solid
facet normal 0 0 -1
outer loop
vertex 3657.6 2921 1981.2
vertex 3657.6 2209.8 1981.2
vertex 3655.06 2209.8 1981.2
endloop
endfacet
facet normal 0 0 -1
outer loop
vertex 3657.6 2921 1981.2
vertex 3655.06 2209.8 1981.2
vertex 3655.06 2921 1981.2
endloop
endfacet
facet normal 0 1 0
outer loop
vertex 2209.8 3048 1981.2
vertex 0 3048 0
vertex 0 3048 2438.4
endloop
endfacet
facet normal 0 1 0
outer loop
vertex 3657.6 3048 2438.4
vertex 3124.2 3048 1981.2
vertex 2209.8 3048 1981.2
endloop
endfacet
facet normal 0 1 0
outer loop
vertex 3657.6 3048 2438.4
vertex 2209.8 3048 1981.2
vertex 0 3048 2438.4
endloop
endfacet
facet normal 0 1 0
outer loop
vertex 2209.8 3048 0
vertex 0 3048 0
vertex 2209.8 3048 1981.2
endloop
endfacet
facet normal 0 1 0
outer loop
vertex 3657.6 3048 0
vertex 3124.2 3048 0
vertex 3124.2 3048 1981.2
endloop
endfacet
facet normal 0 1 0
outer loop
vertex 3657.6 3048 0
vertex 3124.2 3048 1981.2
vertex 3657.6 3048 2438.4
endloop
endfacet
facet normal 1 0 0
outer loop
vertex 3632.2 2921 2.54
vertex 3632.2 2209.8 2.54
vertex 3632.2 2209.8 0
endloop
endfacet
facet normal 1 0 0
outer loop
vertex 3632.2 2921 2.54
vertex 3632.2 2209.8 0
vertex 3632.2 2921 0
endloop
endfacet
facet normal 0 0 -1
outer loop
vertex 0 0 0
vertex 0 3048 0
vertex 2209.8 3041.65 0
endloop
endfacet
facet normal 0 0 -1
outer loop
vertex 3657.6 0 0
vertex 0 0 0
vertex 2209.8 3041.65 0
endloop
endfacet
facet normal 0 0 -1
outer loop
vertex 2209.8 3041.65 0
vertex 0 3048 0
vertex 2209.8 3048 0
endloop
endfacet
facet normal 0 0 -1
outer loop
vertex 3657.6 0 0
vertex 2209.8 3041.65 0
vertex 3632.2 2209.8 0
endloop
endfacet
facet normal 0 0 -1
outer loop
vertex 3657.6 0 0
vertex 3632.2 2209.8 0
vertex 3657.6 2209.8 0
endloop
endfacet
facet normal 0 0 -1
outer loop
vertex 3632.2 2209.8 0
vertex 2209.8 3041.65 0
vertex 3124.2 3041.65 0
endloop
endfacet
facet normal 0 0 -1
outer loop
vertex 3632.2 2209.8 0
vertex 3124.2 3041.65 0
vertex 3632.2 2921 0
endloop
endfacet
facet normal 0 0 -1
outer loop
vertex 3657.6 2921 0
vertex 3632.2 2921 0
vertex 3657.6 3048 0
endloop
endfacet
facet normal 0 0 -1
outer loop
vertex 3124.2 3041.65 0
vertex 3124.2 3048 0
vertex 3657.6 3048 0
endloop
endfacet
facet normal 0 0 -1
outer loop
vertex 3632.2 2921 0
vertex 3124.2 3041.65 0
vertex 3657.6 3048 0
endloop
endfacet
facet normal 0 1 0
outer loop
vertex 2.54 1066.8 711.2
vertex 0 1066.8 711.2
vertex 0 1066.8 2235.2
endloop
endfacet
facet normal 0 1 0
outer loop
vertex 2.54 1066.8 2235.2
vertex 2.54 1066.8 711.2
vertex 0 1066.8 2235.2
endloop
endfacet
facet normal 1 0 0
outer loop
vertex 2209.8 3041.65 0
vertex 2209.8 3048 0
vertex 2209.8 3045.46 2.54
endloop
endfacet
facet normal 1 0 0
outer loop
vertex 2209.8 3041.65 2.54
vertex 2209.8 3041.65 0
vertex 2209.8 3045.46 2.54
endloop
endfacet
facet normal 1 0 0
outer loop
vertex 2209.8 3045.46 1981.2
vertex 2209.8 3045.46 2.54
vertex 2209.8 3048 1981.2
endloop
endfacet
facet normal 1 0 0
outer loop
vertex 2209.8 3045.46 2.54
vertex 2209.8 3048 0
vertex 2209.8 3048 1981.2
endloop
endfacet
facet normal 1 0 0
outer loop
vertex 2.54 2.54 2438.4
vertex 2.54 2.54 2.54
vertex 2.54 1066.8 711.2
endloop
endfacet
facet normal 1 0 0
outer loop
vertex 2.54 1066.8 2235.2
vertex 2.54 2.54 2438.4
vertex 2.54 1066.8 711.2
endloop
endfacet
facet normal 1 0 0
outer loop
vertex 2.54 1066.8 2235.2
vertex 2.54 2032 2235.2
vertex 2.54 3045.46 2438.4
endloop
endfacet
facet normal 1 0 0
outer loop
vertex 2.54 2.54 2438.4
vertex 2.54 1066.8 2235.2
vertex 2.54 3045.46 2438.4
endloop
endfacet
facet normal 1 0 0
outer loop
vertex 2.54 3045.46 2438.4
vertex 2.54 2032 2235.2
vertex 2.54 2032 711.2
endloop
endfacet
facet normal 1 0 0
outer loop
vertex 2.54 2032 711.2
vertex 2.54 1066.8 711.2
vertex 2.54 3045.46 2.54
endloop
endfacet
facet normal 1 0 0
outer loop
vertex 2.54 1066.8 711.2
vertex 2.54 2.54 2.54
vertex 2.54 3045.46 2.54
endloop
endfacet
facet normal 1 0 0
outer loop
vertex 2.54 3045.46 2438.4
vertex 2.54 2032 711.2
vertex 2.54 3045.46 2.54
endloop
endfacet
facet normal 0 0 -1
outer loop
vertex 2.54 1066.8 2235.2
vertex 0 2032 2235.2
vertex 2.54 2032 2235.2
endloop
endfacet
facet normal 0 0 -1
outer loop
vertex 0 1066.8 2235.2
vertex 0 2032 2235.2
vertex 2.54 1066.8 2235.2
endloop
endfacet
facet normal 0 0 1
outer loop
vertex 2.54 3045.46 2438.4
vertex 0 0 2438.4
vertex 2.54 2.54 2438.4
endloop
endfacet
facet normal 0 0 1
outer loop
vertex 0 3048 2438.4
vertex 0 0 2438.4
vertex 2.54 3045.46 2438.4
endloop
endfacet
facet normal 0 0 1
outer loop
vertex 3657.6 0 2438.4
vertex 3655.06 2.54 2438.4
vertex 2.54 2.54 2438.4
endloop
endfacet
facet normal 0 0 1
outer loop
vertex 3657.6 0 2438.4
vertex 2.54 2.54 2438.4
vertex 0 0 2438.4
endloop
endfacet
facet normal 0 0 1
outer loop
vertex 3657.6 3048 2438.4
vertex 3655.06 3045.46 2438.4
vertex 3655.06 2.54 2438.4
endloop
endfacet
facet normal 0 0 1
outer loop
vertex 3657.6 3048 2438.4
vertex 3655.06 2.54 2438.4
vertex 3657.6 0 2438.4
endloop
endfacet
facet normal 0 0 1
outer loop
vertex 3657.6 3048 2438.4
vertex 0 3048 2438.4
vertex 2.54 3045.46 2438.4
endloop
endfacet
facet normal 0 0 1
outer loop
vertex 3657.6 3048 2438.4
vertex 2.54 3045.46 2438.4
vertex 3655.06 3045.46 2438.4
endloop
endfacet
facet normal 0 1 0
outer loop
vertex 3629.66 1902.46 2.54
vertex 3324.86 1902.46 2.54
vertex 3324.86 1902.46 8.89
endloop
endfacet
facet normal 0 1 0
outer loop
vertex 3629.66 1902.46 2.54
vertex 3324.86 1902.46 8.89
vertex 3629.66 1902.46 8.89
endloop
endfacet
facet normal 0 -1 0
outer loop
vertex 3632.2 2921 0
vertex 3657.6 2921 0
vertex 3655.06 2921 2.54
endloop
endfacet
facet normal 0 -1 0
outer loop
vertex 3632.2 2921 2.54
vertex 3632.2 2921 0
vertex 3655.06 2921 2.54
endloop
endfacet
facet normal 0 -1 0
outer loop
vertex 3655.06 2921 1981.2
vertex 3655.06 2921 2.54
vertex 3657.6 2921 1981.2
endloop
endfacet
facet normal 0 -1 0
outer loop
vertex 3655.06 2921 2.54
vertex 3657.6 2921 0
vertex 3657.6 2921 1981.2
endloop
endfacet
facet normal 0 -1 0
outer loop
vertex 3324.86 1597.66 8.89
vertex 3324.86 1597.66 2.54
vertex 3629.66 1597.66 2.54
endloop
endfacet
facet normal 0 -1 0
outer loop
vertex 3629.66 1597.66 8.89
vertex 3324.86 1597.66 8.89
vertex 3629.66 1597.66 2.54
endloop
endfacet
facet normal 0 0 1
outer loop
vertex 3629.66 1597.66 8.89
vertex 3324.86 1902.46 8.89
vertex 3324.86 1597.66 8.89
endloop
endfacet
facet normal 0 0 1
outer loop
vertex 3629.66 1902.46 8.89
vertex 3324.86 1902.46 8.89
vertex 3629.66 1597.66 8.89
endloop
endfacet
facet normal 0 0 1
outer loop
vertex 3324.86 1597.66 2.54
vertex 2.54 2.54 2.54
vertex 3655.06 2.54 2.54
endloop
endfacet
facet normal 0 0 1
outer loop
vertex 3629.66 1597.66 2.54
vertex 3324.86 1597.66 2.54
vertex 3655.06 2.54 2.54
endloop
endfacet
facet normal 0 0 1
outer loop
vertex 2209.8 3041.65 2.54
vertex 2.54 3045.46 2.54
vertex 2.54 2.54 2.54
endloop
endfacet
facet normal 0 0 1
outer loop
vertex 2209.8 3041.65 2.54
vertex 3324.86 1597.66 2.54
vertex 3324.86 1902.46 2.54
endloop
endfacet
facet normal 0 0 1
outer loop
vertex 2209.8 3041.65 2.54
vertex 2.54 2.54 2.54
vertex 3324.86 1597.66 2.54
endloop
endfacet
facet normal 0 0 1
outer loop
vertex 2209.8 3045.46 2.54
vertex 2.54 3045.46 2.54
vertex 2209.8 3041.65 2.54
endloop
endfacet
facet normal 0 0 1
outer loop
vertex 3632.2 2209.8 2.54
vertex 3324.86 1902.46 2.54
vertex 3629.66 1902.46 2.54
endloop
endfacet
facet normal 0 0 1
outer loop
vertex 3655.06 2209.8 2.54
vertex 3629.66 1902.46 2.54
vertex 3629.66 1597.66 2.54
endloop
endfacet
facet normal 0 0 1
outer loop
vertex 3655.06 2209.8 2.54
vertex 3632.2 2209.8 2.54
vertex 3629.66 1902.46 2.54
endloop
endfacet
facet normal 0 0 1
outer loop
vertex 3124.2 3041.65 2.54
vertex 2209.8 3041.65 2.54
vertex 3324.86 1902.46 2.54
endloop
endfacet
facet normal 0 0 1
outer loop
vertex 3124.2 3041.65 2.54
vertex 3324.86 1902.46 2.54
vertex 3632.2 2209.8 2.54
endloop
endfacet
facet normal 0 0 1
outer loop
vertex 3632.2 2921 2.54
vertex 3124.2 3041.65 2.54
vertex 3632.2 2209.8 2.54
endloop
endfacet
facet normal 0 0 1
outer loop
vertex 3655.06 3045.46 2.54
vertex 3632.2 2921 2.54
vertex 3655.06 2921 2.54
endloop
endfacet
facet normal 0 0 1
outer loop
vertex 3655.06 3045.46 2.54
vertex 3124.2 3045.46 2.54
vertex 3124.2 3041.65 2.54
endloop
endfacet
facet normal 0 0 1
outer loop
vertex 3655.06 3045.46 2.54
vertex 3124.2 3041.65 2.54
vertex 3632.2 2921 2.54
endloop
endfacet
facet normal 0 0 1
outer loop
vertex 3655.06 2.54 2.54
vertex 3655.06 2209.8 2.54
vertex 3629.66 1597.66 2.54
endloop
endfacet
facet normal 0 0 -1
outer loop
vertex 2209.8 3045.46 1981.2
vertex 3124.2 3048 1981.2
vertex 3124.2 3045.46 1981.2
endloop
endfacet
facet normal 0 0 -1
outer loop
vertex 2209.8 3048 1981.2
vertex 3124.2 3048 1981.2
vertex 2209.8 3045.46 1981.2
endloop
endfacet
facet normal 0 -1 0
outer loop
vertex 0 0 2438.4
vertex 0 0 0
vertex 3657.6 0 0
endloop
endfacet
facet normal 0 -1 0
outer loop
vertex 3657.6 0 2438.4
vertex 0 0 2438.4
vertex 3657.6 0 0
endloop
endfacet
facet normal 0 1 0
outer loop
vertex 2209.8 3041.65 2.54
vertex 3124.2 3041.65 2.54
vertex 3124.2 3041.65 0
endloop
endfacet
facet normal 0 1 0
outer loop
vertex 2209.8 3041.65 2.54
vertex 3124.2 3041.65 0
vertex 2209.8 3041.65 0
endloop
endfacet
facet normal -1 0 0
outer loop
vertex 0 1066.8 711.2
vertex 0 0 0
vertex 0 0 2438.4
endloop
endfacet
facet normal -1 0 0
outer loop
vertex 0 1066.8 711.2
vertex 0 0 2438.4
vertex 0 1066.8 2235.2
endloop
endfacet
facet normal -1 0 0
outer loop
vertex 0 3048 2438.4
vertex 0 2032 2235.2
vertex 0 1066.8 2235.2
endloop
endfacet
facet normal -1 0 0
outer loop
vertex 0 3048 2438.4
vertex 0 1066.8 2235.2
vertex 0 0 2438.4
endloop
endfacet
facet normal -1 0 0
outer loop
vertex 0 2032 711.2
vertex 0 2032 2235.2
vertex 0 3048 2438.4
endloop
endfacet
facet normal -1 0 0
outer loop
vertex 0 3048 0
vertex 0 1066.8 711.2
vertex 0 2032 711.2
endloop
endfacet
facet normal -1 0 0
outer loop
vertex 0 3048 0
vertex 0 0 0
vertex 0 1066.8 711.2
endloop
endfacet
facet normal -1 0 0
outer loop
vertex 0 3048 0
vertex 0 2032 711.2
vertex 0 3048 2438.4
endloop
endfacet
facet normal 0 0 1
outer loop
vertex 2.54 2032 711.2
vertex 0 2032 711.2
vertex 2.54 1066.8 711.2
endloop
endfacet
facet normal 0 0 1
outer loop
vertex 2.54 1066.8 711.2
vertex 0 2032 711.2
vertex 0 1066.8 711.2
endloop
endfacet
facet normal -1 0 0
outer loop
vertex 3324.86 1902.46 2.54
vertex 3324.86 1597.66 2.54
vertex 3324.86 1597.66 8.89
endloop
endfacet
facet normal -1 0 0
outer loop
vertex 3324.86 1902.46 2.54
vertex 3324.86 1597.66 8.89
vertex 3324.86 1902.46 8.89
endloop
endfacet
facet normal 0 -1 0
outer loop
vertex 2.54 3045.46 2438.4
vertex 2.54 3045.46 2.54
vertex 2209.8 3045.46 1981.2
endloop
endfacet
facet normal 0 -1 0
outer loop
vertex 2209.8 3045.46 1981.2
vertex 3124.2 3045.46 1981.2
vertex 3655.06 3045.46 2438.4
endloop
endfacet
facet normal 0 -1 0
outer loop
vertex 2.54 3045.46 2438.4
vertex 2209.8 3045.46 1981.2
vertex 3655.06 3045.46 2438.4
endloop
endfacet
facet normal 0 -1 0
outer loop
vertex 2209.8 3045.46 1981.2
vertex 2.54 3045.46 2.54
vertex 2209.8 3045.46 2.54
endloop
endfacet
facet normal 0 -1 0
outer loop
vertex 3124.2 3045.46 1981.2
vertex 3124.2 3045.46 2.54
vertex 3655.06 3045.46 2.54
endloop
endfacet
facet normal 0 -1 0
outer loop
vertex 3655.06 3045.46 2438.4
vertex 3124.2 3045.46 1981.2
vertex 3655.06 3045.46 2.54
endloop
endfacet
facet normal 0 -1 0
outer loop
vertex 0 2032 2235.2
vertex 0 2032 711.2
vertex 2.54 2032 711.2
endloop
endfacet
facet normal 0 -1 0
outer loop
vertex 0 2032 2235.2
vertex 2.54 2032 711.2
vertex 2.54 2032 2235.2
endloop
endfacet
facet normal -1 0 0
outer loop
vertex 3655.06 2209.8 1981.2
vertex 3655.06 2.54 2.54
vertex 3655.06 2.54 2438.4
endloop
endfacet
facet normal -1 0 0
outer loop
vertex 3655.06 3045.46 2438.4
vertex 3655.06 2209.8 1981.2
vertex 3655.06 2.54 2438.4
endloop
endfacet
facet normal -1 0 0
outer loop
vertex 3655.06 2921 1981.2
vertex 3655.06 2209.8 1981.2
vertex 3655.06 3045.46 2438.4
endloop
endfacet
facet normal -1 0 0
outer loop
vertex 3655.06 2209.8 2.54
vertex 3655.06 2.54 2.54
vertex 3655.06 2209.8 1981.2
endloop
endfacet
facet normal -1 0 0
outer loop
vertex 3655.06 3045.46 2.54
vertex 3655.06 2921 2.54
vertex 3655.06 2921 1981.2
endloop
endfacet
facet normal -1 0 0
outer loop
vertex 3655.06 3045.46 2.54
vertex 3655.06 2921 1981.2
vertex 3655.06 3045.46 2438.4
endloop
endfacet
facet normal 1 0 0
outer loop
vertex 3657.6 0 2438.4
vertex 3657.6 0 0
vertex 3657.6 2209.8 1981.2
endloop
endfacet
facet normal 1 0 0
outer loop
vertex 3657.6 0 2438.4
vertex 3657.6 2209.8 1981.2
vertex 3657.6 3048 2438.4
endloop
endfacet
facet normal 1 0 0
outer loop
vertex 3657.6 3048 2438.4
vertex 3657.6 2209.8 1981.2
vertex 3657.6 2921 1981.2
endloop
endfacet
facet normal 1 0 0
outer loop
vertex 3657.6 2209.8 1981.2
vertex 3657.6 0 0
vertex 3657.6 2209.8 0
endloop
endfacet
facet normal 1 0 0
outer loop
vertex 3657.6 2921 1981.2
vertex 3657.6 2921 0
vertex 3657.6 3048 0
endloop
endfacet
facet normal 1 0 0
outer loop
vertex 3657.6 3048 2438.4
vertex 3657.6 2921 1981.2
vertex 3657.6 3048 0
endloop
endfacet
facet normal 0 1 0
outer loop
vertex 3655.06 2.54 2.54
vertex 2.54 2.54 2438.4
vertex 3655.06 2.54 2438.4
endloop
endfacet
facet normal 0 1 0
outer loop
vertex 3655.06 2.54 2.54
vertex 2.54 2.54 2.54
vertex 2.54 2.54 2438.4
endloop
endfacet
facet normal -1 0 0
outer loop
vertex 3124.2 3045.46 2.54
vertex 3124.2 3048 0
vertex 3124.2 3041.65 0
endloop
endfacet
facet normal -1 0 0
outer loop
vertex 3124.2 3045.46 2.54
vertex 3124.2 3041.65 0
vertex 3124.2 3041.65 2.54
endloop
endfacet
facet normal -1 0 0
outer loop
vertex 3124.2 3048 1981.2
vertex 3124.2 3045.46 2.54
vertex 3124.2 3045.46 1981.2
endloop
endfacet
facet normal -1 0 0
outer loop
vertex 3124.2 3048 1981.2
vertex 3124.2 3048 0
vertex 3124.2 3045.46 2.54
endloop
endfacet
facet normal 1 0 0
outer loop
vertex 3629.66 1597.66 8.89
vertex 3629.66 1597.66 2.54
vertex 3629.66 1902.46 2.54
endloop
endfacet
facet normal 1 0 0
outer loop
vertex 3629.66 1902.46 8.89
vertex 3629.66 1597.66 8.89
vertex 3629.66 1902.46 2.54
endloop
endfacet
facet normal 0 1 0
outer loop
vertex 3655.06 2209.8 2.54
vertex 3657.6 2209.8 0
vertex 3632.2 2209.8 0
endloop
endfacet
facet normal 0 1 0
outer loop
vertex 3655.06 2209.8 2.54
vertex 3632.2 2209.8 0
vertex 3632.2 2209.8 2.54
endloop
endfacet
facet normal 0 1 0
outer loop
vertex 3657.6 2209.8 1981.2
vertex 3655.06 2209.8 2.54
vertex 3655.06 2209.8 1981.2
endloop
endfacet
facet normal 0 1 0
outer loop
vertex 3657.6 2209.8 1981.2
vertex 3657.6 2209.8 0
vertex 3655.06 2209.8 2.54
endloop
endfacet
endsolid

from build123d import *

# Parameters (mm, degrees)
F0_W      = 3657.6
F0_H      = 3048
F1_DEPTH  = 2438.4
F2_T      = -2.54
F3_W      = 711.2
F3_H      = 1981.2
F4_DEPTH  = 25.4
F5_W      = 965.2
F5_H      = 1524
F6_DEPTH  = 25.4
F7_W      = 304.8
F7_H      = 304.8
F8_DEPTH  = 6.35
F9_W      = 914.4
F9_H      = 1981.2
F10_DEPTH = 6.35


with BuildPart() as f1:
    # F0 (on Top) → F1 (new body)
    with BuildSketch(Plane.XY):
        with Locations((1828.8, 1524)):
            Rectangle(F0_W, F0_H)
    extrude(amount=F1_DEPTH)

    # F2
    f2_openings = [f1.faces().sort_by_distance(p)[0] for p in [
        (1828.8, 1524, 2438.4),
    ]]
    offset(amount=F2_T, openings=f2_openings)

    # F3 (on face) → F4 (cut)
    with BuildSketch(Plane.YZ.offset(3657.6)):
        with Locations((2565.4, 990.6)):
            Rectangle(F3_W, F3_H)
    extrude(amount=-F4_DEPTH, mode=Mode.SUBTRACT)

    # F5 (on face) → F6 (cut)
    with BuildSketch(Plane(origin=(0, 0, 0), x_dir=(0, -1, 0), z_dir=(-1, 0, 0))):
        with Locations((-1549.4, 1473.2)):
            Rectangle(F5_W, F5_H)
    extrude(amount=-F6_DEPTH, mode=Mode.SUBTRACT)

    # F7 (on face) → F8 (join)
    with BuildSketch(Plane.XY.offset(2.54)):
        with Locations((3477.26, 1750.06)):
            Rectangle(F7_W, F7_H)
    extrude(amount=F8_DEPTH)

    # F9 (on face) → F10 (cut)
    with BuildSketch(Plane(origin=(0, 3048, 0), x_dir=(-1, 0, 0), z_dir=(0, 1, 0))):
        with Locations((-2667, 990.6)):
            Rectangle(F9_W, F9_H)
    extrude(amount=-F10_DEPTH, mode=Mode.SUBTRACT)


solid = f1.part
